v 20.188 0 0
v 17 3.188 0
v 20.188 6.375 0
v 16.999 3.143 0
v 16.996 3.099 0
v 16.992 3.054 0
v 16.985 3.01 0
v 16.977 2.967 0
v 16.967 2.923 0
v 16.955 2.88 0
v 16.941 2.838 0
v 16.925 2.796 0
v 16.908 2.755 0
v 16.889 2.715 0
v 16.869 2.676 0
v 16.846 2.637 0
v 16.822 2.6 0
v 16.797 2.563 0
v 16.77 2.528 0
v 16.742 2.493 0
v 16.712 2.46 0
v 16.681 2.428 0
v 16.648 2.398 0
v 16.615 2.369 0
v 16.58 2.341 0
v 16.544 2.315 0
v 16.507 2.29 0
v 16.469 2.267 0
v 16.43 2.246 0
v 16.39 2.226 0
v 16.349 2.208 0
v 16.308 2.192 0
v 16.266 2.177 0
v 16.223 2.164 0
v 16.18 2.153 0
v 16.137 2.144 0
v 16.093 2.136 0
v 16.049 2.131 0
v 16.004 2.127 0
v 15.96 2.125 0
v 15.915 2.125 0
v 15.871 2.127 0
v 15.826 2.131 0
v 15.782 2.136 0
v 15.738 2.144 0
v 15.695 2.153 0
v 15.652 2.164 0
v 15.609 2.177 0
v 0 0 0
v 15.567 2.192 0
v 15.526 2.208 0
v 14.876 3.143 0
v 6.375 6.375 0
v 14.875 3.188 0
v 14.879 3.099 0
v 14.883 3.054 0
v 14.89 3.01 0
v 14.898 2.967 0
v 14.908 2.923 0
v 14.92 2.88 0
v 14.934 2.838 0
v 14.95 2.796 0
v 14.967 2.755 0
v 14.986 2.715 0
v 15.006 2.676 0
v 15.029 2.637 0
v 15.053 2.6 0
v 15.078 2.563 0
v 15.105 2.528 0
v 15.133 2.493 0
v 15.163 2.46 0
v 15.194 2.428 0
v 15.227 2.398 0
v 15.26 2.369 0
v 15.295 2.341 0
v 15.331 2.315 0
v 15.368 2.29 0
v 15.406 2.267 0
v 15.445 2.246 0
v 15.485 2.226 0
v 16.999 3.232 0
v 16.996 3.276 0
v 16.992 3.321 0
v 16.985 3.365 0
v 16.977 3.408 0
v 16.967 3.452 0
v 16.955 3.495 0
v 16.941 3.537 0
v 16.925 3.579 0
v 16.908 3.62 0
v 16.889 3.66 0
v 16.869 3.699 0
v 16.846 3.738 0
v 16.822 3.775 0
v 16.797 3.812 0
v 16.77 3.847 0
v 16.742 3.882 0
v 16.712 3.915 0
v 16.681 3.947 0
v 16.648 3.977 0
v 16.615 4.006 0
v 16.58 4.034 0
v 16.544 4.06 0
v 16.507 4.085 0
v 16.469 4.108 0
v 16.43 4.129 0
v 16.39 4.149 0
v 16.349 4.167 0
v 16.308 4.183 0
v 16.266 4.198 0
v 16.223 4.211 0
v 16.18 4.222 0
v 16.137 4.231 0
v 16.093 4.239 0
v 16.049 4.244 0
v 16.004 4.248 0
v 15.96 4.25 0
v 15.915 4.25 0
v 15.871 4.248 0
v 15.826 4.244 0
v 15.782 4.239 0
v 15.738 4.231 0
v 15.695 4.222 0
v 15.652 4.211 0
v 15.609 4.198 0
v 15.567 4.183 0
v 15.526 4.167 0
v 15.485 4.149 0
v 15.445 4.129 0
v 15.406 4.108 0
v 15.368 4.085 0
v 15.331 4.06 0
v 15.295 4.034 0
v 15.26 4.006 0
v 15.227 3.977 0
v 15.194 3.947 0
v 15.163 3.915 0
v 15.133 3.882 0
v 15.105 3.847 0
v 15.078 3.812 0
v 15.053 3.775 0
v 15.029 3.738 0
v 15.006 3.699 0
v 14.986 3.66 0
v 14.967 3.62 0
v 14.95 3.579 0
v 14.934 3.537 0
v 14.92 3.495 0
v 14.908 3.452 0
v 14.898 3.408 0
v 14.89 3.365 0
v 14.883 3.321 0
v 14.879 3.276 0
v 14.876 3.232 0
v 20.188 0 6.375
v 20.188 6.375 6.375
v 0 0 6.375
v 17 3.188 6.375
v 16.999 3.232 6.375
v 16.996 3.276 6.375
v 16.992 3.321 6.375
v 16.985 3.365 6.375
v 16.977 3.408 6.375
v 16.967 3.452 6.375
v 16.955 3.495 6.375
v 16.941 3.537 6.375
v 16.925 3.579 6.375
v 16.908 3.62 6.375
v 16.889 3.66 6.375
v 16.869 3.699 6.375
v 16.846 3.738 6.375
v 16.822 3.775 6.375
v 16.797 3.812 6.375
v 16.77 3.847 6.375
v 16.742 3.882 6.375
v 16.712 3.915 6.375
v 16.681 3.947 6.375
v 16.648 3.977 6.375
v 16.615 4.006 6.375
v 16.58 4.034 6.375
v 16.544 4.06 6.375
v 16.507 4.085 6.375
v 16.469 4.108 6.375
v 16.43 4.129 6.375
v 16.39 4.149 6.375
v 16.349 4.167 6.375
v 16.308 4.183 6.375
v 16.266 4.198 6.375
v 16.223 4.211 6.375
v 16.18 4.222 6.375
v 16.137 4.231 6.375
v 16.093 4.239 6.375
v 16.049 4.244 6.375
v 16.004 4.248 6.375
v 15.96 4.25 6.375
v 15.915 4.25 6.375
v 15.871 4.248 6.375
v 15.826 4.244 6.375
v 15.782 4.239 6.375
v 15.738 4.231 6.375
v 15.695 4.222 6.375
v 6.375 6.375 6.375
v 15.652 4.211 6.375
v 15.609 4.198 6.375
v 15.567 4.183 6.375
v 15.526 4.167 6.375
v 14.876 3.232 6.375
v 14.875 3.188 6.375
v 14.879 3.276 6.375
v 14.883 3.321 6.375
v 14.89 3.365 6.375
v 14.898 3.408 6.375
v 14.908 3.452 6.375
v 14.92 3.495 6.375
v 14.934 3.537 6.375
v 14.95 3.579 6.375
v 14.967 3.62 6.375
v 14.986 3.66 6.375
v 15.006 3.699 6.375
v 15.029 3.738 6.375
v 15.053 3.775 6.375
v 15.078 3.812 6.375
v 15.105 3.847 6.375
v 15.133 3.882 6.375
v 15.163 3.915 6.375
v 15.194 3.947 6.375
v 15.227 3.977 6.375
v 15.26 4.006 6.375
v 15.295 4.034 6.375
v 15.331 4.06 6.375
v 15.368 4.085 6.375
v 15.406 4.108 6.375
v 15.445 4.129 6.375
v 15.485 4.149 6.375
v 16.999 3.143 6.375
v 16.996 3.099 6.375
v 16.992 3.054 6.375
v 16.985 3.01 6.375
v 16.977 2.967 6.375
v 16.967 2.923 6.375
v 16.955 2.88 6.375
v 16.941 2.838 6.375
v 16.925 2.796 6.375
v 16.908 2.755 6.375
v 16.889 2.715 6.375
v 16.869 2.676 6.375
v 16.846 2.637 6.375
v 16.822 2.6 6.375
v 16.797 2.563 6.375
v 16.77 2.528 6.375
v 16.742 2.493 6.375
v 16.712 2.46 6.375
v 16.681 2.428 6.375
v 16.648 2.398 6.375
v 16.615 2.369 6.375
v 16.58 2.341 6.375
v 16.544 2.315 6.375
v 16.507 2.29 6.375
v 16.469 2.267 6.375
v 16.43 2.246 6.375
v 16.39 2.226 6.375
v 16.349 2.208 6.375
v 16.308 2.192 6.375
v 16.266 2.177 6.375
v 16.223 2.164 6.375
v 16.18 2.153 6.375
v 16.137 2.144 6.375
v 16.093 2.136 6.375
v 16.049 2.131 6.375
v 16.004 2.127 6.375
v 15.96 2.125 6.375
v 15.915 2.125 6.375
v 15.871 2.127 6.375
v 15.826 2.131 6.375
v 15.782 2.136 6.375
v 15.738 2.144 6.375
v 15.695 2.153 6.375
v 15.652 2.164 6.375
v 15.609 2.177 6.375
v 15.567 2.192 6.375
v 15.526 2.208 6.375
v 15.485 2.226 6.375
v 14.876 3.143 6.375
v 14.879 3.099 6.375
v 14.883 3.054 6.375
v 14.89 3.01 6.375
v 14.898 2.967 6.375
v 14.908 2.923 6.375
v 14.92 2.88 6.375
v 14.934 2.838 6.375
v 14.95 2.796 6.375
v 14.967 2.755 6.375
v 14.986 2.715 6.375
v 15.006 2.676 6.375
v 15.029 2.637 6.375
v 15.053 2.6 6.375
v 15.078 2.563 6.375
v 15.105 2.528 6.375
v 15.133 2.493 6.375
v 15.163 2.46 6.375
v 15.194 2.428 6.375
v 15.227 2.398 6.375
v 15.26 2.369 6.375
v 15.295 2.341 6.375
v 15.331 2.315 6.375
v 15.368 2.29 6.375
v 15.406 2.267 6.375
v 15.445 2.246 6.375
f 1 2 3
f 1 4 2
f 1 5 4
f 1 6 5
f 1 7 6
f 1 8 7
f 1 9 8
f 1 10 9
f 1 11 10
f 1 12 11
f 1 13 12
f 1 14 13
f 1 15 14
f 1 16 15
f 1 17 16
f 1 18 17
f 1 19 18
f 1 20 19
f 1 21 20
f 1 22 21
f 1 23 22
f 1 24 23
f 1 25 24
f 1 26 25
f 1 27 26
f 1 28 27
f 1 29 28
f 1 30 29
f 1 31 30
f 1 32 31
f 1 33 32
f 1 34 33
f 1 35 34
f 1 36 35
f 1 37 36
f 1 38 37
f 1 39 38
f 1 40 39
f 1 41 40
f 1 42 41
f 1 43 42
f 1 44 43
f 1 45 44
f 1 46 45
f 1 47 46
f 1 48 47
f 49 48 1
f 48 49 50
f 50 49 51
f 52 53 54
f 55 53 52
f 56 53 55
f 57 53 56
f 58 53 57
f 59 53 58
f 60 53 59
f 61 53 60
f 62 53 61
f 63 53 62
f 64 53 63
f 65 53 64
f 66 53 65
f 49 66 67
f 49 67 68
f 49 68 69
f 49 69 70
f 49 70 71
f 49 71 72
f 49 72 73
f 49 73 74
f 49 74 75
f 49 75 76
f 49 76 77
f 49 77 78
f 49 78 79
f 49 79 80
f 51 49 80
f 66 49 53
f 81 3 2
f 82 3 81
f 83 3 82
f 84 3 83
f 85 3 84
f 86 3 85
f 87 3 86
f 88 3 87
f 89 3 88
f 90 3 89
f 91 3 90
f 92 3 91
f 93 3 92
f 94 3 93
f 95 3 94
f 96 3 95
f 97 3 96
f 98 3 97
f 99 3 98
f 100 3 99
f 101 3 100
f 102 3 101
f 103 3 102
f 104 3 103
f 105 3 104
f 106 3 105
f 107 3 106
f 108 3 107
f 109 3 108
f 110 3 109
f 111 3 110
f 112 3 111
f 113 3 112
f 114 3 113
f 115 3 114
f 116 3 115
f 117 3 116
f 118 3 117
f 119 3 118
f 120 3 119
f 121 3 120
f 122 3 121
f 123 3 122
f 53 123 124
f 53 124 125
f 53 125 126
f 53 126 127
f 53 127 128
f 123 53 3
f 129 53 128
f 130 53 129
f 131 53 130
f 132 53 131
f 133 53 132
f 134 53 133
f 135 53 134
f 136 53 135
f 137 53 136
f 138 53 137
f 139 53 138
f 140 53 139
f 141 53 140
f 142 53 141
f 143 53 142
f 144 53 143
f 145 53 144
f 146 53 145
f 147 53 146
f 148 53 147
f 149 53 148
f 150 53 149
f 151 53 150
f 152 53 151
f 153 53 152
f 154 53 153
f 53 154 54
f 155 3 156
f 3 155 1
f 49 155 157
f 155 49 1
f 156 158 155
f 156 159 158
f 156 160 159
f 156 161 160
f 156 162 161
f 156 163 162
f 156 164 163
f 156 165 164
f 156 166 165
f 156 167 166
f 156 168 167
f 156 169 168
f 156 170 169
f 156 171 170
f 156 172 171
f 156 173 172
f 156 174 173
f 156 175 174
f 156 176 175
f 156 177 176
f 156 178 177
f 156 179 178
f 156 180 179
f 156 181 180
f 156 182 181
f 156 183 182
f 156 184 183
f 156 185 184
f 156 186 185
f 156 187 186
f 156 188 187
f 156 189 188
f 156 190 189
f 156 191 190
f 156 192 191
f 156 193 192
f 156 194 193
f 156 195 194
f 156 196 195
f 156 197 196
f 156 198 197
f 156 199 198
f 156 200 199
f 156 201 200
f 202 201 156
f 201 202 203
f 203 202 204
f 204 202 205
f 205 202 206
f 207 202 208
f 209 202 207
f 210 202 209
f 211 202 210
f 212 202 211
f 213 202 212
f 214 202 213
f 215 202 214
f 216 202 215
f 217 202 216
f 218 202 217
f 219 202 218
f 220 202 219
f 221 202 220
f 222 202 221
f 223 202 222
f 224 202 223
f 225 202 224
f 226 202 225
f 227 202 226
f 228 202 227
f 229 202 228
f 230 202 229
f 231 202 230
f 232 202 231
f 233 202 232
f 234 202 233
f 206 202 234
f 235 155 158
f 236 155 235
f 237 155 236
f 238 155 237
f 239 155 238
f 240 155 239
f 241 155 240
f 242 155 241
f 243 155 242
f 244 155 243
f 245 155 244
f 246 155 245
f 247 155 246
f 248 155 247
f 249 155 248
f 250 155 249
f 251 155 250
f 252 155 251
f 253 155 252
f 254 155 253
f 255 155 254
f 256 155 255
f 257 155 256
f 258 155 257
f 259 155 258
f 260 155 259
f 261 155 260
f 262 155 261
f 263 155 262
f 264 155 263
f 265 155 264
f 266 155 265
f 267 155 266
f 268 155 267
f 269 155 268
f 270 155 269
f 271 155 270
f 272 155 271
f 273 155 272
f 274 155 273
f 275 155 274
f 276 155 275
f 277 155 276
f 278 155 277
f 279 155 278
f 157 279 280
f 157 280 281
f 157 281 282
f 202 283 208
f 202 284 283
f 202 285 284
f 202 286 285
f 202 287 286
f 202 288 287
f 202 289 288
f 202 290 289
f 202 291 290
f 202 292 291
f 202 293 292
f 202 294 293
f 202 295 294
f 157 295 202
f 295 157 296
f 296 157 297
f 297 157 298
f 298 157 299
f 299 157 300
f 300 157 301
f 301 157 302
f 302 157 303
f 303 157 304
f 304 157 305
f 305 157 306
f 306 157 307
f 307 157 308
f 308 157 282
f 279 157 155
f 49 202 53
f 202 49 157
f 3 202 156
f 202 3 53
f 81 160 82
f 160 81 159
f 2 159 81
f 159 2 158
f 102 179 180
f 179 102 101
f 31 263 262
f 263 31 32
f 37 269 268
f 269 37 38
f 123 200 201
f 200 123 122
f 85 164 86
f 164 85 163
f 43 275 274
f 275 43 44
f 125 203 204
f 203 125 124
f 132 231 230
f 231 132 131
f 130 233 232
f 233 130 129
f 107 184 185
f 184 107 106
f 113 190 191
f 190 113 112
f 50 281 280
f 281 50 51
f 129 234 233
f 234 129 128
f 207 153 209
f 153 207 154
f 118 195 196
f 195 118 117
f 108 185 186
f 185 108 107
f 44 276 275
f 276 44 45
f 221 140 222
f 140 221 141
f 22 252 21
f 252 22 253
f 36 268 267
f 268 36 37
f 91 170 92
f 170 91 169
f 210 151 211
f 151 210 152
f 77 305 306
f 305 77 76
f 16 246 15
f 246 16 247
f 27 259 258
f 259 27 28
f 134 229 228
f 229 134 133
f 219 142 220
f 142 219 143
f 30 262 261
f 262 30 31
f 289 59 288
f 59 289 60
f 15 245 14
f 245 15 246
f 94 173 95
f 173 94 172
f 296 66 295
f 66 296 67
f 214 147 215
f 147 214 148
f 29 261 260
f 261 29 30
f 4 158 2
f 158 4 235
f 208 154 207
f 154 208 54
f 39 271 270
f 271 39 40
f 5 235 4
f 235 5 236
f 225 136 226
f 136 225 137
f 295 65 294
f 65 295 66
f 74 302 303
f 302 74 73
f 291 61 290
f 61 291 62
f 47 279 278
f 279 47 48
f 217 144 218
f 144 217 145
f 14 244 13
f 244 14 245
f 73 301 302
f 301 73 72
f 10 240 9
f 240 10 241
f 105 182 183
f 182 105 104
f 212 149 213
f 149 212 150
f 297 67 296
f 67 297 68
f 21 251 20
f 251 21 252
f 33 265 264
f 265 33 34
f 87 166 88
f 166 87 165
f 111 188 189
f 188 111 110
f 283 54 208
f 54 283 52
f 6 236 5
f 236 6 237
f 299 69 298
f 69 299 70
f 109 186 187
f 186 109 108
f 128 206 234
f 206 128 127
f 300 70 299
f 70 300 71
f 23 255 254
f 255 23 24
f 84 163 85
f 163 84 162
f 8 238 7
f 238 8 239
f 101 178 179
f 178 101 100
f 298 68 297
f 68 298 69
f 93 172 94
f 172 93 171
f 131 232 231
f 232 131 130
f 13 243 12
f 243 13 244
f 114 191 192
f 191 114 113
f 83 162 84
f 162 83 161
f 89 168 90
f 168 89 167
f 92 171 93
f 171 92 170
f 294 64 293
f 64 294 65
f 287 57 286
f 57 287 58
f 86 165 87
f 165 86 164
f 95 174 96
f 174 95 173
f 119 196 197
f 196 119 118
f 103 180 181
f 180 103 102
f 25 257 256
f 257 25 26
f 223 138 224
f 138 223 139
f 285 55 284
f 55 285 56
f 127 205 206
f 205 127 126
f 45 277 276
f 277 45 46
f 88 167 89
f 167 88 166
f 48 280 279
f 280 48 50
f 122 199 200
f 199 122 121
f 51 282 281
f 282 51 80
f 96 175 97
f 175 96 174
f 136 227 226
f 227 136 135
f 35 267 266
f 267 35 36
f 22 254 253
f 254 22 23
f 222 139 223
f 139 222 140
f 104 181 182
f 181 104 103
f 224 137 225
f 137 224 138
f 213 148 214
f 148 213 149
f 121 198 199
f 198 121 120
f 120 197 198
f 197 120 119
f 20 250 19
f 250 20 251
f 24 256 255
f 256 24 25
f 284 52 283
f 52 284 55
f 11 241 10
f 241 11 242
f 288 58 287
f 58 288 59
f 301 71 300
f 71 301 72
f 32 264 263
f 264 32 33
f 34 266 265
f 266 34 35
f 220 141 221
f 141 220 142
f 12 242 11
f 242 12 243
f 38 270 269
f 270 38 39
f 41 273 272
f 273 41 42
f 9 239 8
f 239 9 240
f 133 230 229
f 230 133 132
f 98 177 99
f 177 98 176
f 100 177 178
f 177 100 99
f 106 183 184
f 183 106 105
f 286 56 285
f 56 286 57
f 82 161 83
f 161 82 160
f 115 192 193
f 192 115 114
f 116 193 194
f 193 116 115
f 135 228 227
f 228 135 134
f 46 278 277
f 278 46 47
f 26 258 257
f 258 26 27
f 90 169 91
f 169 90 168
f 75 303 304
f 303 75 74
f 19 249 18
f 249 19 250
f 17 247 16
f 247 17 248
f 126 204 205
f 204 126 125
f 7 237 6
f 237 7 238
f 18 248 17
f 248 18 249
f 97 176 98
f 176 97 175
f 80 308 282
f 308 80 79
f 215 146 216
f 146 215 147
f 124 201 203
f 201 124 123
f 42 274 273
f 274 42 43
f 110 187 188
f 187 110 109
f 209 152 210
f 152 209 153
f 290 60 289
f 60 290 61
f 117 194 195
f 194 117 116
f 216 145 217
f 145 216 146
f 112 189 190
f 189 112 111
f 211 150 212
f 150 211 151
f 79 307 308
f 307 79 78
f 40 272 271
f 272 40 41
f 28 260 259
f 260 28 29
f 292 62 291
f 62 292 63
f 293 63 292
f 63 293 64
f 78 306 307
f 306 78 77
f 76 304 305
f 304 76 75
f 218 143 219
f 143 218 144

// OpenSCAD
$fn = 150;

difference() {
	linear_extrude(height = 6.375) {
		polygon(points = [[0, 0], [6.375, 6.375], [20.1875, 6.375], [20.1875, 0]]);
	}
	translate(v = [15.9375, 3.1875, -1]) {
		cylinder(d = 2.125, h = 8.375);
	}
}
